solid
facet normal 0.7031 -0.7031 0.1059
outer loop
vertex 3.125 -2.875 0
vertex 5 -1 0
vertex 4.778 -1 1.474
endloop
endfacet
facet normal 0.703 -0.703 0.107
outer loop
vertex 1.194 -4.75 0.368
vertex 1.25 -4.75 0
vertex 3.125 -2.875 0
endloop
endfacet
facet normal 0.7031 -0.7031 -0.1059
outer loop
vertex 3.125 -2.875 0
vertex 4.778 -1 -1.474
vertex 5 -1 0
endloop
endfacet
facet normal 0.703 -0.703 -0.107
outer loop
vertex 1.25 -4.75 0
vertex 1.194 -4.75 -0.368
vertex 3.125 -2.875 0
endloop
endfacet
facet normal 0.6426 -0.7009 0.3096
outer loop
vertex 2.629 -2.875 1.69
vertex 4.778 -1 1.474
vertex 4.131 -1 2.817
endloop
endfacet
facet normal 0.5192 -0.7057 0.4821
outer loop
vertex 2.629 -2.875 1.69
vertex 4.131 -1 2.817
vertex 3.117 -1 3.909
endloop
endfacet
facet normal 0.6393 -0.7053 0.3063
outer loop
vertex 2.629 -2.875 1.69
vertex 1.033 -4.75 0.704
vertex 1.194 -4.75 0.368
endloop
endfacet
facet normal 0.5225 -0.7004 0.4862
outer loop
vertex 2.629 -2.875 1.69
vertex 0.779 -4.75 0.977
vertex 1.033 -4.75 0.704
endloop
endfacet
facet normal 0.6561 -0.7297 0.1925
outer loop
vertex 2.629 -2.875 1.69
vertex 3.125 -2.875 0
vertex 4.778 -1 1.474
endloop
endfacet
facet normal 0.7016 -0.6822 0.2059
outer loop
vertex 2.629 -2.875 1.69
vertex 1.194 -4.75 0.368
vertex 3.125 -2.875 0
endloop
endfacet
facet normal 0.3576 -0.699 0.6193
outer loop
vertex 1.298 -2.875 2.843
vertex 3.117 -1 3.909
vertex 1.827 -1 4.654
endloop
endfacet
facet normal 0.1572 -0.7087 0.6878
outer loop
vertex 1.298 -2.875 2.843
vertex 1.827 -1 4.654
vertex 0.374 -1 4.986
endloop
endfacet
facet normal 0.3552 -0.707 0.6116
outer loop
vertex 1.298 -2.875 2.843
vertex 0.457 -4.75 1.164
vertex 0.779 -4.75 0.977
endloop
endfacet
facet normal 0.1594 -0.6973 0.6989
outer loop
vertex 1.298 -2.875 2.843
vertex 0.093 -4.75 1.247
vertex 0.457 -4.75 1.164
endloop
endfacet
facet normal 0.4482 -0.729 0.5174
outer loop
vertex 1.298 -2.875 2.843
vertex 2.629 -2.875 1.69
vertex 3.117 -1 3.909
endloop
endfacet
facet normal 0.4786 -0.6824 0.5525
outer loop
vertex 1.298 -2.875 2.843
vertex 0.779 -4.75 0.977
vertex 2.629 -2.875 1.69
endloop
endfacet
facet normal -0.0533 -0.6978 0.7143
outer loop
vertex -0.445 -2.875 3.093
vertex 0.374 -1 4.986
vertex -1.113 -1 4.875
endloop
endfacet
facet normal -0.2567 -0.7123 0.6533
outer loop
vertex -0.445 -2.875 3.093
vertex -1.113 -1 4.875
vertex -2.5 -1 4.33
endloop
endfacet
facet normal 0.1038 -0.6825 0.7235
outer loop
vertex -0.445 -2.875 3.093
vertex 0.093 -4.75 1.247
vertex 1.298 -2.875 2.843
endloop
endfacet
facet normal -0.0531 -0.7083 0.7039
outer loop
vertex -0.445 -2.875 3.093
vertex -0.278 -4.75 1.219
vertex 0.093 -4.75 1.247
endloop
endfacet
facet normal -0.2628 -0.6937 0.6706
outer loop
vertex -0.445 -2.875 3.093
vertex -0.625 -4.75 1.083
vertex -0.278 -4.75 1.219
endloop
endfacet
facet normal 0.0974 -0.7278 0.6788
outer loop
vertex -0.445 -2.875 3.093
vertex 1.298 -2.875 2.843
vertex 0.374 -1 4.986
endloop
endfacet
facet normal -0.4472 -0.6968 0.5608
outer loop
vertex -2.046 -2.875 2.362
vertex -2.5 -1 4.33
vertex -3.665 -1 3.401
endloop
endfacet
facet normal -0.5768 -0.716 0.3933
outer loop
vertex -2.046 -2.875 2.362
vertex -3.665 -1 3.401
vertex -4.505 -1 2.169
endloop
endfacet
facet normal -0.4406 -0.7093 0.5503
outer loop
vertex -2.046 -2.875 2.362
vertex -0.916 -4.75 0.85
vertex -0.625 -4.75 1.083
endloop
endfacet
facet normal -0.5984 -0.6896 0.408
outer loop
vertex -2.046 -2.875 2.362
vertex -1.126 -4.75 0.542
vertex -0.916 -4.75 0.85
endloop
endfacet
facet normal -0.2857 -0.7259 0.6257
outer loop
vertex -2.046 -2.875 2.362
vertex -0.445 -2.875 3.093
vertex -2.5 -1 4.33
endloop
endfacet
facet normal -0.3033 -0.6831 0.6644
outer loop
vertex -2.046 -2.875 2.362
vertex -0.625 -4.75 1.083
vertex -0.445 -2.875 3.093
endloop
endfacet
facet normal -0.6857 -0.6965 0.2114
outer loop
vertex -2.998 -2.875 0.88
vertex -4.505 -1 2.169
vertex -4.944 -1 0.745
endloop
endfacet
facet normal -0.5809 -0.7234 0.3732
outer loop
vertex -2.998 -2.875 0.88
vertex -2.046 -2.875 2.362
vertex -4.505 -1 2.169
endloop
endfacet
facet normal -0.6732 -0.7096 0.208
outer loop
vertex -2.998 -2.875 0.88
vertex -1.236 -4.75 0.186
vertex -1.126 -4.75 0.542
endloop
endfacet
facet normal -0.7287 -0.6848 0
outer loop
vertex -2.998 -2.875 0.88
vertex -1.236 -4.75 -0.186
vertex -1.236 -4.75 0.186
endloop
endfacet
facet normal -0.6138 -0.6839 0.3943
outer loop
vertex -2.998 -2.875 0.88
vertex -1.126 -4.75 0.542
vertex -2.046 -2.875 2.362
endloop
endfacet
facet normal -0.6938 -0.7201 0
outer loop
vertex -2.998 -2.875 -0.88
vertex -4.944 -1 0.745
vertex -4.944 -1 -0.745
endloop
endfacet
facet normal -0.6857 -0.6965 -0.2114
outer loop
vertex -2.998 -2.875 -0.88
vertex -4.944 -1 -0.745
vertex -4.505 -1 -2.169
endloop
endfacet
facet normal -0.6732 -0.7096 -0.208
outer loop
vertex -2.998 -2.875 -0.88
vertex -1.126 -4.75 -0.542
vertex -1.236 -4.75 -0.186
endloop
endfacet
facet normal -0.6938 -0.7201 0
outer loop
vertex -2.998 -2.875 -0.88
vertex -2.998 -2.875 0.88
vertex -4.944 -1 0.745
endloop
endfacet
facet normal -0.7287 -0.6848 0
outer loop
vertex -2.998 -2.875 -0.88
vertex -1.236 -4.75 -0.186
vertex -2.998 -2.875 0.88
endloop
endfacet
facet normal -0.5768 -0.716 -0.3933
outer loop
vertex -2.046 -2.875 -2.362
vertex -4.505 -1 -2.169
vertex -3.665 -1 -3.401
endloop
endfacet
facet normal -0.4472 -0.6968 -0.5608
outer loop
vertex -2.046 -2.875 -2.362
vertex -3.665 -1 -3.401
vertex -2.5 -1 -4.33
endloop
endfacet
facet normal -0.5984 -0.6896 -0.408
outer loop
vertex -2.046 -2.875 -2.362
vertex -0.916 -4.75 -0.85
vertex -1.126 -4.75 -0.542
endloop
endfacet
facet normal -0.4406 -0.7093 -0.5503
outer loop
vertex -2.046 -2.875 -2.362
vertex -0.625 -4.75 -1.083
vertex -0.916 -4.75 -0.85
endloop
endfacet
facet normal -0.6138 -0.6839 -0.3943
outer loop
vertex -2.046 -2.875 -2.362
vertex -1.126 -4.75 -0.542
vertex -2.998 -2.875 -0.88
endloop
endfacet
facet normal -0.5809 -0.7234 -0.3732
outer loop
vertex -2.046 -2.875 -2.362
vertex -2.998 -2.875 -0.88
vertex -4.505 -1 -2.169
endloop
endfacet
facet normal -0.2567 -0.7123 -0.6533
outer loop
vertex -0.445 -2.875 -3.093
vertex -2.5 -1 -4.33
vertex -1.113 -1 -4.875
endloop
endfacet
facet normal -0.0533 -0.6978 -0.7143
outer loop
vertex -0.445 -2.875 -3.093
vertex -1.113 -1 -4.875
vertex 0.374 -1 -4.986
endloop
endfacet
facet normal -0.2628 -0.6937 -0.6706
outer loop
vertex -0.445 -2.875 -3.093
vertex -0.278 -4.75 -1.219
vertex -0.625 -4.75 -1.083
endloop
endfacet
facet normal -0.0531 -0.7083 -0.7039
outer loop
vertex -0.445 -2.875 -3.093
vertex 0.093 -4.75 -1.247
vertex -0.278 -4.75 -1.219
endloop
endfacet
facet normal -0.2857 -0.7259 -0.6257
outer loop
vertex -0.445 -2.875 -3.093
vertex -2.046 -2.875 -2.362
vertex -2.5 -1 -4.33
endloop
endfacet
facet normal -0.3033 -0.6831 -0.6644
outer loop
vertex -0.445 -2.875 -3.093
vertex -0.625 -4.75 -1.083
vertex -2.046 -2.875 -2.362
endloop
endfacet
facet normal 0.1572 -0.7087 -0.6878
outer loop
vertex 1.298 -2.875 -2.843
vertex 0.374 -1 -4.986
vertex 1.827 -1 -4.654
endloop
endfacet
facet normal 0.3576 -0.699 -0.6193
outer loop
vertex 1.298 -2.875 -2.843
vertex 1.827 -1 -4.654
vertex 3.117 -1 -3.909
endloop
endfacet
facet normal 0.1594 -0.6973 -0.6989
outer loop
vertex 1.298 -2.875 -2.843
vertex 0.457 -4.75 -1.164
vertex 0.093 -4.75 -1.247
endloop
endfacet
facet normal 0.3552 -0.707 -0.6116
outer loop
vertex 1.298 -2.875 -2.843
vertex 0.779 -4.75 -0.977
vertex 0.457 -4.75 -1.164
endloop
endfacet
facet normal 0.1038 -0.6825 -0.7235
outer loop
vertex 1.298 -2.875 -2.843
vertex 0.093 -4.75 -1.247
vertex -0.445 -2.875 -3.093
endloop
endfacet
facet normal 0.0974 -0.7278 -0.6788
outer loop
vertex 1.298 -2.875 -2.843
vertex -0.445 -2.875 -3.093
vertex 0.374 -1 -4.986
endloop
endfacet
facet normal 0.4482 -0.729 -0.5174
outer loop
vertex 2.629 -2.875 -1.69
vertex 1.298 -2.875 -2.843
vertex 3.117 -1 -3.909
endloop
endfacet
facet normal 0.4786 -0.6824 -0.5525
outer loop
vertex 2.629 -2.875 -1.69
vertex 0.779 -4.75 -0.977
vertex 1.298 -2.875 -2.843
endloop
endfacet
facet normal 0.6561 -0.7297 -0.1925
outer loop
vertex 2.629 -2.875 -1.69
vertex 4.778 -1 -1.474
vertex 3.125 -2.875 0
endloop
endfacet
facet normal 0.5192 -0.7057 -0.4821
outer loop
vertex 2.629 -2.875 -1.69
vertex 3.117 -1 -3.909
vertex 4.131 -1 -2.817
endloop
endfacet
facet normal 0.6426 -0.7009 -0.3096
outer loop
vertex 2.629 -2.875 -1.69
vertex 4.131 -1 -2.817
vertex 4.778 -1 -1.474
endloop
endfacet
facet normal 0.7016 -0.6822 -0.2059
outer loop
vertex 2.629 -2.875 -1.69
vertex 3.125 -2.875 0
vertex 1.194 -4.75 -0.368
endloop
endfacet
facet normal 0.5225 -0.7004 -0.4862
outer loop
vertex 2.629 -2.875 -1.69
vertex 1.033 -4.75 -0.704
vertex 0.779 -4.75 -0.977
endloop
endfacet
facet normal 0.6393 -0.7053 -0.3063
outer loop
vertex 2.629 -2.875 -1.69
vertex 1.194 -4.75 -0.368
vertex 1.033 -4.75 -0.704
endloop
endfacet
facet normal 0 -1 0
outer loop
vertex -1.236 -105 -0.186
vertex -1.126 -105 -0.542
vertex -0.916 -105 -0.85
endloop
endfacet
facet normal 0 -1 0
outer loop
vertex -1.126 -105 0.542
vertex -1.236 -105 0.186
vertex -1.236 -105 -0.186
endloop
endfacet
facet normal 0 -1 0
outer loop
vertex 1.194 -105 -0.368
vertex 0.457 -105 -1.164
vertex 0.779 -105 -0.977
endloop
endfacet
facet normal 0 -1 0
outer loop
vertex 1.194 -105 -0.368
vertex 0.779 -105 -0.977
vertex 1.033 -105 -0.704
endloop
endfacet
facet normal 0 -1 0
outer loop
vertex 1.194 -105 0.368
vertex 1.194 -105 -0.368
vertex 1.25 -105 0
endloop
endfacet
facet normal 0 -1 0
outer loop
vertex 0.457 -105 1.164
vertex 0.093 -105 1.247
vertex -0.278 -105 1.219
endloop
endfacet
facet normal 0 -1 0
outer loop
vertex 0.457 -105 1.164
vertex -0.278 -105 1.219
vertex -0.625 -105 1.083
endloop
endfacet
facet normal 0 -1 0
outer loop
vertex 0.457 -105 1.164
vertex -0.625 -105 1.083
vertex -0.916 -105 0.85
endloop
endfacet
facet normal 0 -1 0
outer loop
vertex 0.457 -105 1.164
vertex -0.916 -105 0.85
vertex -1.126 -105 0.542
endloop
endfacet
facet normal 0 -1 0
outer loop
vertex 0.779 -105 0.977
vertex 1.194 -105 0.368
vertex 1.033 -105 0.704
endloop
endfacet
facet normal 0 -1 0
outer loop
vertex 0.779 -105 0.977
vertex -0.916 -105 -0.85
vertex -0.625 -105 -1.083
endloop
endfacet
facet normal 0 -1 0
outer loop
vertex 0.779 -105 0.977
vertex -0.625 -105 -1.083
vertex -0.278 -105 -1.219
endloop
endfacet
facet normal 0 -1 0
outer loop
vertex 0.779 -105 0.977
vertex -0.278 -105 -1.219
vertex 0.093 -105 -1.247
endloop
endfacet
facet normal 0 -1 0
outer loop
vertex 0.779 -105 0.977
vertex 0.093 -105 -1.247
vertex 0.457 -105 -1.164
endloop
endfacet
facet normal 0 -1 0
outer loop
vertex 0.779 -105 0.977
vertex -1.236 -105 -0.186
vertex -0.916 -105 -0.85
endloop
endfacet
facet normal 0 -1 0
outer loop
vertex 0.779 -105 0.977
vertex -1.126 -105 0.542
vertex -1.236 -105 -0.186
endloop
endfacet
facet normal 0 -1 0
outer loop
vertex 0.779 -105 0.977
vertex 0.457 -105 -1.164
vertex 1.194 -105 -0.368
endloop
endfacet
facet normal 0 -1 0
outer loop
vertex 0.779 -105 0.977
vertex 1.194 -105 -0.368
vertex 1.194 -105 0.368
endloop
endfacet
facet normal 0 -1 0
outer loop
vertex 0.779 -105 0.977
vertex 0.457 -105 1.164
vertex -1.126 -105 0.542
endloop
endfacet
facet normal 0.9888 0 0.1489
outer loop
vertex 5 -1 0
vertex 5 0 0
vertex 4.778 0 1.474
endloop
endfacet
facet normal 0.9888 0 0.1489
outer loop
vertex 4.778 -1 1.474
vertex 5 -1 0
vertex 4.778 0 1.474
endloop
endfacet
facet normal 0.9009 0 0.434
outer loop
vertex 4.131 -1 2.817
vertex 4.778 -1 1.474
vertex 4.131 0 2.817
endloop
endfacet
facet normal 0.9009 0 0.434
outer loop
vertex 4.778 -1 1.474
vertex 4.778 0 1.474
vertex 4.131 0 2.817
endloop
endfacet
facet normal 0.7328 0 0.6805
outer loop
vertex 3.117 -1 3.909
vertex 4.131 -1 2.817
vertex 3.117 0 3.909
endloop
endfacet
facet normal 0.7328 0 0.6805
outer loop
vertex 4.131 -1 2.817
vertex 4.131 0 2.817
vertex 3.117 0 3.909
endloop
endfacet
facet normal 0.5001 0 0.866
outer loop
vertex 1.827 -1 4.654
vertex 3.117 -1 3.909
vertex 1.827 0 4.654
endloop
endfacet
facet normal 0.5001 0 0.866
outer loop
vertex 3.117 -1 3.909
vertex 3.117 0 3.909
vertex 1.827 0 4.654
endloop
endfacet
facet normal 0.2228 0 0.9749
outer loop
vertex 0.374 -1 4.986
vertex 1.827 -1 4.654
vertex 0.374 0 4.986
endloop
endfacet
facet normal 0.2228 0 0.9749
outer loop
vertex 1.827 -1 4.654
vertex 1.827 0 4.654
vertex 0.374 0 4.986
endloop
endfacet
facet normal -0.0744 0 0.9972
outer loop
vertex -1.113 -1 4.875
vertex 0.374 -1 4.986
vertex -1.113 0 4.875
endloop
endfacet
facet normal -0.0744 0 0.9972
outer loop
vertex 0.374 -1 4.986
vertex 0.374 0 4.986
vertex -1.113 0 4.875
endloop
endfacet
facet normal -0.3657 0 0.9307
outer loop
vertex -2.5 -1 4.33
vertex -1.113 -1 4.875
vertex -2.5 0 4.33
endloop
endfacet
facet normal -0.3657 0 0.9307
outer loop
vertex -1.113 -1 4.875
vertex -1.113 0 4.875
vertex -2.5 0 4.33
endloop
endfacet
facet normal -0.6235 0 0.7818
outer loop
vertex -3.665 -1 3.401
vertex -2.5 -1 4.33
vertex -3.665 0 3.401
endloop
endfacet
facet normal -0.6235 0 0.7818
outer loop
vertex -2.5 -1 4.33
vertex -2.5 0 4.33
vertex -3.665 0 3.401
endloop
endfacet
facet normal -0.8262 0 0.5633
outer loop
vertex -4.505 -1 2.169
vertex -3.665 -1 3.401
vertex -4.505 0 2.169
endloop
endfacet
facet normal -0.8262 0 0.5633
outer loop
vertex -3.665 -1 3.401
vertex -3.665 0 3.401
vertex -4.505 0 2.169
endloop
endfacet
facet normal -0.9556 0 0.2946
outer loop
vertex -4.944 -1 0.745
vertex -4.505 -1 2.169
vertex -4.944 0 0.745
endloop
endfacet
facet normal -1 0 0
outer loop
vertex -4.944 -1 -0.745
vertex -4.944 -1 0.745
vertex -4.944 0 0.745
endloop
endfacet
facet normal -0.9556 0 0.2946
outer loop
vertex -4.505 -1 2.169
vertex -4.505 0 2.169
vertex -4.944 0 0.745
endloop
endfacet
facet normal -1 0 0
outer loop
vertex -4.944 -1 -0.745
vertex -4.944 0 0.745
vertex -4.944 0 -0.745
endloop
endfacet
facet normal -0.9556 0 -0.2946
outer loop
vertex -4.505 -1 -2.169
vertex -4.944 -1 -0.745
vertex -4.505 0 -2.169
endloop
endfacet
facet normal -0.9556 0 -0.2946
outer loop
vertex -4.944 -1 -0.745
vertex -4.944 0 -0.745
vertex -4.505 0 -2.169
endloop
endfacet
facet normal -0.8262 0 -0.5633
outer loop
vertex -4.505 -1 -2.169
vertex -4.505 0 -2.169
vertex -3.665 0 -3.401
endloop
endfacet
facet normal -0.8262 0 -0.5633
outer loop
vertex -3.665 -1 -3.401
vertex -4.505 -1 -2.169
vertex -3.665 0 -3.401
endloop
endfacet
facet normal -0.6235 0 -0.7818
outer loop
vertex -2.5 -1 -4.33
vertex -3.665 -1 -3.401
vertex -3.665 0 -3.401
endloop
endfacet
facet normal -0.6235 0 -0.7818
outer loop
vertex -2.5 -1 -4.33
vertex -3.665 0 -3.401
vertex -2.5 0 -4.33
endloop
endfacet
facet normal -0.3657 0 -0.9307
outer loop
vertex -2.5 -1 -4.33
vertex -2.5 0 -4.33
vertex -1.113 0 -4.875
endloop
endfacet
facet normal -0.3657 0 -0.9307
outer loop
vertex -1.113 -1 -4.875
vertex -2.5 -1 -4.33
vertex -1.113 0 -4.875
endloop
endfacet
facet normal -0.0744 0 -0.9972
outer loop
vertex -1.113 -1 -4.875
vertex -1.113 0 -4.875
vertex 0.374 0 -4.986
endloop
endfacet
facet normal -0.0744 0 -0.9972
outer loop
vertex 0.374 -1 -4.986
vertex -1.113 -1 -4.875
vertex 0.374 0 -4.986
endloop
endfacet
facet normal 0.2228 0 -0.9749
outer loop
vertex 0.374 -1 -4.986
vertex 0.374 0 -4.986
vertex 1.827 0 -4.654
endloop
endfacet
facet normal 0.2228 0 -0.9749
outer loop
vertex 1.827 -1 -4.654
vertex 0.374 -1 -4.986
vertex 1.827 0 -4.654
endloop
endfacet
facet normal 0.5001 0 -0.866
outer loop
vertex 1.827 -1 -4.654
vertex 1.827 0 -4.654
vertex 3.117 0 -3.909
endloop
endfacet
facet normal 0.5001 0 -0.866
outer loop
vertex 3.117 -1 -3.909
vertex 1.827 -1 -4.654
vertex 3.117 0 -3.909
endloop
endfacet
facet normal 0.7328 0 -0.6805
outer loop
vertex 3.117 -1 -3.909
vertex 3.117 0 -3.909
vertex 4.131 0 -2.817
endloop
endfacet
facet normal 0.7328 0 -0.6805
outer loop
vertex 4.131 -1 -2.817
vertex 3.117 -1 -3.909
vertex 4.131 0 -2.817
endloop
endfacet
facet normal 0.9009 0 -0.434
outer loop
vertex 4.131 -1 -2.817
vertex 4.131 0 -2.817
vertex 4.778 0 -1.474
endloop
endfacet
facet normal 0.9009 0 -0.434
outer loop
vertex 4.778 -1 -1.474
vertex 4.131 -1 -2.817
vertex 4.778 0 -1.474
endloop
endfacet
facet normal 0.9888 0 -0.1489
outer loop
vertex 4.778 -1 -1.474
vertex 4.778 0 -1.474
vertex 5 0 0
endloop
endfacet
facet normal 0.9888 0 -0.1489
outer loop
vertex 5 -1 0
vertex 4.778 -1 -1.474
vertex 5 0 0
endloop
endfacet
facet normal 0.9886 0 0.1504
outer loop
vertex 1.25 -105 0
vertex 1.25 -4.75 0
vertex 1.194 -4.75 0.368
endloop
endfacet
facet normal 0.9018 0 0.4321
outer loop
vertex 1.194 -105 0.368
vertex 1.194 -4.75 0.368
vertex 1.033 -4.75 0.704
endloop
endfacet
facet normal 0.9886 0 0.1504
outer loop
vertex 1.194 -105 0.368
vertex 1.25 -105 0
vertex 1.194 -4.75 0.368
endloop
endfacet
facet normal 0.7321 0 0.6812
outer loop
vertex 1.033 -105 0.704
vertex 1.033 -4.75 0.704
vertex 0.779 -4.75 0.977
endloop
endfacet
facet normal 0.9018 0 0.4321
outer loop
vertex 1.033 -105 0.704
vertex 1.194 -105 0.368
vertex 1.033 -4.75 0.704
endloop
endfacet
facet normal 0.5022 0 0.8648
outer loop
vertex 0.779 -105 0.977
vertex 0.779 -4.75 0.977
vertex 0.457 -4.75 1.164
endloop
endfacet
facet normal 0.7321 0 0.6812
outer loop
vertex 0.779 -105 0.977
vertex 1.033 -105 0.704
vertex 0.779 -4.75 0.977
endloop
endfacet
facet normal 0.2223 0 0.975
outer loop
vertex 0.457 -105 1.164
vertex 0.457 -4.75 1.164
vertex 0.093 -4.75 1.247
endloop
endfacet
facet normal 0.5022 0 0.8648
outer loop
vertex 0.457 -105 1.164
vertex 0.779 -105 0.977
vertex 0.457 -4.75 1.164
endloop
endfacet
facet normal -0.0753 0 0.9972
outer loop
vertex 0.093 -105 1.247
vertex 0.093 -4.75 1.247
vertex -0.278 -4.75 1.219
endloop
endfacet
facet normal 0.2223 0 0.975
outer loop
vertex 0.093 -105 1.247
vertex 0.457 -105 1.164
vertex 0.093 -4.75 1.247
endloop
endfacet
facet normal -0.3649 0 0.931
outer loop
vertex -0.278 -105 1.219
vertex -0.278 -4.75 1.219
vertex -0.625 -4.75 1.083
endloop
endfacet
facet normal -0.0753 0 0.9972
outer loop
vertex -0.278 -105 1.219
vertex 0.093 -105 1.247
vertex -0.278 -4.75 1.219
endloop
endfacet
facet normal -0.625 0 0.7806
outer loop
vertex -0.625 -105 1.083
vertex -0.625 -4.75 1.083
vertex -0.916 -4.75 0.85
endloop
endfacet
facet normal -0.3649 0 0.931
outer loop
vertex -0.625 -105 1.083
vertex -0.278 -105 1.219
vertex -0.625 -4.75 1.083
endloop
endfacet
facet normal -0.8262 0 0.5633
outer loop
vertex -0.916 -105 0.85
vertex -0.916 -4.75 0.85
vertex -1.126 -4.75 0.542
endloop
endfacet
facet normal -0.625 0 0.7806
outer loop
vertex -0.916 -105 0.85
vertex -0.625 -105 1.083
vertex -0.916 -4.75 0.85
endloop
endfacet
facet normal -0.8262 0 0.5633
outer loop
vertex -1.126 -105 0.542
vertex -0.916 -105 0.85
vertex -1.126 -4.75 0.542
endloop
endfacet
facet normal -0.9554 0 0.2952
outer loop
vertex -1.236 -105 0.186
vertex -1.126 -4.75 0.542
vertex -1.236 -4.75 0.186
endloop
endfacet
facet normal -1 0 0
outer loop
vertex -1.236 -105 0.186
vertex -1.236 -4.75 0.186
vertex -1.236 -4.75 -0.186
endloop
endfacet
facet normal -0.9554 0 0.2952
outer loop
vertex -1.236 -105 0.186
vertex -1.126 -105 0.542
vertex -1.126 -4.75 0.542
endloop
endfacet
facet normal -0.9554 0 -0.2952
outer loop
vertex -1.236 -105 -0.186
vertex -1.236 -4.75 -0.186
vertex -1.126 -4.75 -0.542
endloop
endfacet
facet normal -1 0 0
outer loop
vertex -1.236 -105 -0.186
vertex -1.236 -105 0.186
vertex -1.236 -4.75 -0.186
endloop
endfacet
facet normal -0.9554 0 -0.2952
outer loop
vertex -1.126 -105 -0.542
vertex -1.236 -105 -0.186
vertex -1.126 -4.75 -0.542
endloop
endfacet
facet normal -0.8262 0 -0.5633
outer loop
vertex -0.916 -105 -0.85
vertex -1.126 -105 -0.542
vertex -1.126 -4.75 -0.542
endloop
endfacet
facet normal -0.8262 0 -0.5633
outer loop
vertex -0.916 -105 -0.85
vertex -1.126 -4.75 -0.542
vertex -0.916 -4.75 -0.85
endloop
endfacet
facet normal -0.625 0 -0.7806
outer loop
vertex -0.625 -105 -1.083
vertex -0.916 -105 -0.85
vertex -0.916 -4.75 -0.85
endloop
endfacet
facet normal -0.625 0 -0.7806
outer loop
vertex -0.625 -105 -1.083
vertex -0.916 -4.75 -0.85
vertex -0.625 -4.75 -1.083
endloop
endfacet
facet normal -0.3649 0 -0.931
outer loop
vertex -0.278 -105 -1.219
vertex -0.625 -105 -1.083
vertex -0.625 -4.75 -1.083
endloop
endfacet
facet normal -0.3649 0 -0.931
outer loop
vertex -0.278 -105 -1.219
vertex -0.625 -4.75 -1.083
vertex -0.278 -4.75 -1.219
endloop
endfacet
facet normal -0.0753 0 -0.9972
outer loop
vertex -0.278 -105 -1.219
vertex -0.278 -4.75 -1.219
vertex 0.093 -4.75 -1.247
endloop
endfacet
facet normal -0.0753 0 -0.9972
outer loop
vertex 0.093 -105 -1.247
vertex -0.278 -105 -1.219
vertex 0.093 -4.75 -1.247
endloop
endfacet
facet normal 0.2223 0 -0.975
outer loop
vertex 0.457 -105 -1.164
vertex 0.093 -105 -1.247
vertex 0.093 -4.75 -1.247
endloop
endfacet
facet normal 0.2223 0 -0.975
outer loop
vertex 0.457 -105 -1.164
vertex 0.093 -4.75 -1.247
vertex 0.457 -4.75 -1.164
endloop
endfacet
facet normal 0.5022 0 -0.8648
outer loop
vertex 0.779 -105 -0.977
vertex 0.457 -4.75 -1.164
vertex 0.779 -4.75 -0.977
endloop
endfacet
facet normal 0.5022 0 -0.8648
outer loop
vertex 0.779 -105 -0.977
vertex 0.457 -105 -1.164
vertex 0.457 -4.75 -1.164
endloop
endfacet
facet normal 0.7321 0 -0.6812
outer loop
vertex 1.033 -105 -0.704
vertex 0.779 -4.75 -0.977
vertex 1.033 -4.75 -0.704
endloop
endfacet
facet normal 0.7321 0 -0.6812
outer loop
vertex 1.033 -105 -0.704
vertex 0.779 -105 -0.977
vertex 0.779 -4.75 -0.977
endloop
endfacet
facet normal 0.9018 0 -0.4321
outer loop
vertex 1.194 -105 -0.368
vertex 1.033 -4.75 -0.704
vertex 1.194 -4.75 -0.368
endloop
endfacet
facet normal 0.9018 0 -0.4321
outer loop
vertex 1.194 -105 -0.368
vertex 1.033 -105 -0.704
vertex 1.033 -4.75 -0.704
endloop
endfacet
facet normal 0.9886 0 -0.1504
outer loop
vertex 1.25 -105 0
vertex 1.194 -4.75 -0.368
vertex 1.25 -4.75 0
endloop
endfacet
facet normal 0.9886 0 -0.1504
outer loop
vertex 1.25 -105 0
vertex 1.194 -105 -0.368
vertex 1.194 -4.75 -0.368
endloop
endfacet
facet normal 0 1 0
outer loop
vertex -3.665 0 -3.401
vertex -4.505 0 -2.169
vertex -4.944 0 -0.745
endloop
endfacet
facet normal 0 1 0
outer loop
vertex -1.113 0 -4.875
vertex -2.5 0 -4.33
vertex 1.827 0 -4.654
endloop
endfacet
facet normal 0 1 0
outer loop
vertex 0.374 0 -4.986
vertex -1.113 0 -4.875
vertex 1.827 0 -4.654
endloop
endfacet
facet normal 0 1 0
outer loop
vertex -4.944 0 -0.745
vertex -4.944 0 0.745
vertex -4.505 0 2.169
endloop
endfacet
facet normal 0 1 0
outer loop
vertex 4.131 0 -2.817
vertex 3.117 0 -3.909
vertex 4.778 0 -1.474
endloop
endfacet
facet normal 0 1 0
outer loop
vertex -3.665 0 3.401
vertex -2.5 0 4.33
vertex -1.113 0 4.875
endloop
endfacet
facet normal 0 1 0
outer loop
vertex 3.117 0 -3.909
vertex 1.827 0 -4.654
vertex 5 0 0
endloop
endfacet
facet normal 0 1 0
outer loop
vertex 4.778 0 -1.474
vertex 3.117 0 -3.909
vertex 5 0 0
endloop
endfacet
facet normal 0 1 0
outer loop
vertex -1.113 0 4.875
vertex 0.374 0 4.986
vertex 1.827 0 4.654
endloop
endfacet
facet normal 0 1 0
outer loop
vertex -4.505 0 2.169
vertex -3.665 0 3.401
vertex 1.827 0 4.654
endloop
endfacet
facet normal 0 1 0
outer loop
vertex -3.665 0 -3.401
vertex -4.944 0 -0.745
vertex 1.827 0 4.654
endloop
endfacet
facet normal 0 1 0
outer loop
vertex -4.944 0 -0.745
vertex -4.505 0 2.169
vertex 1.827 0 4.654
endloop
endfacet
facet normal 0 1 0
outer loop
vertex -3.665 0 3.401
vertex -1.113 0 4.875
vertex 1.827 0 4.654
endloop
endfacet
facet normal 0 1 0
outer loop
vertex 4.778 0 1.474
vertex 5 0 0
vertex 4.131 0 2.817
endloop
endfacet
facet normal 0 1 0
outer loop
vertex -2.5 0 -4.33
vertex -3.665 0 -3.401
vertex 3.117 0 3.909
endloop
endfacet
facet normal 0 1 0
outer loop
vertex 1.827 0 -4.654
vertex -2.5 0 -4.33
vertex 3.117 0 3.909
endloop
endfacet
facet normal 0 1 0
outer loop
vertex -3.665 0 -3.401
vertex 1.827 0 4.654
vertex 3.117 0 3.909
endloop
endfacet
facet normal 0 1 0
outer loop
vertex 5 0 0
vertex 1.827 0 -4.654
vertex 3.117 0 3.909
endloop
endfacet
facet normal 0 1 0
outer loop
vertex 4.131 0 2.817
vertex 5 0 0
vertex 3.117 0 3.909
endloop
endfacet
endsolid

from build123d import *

# Parameters (mm, degrees)
F0_R        = 5
F1_DEPTH    = 5
F2_R        = 1.25
F3_DEPTH    = 100
F4_S5_R     = 1.25
F4_T6_DEPTH = 9


# Not quite as in the source:
# - a fillet or chamfer that OpenCascade refuses, or shapes differently, is made with other operations: its cross-section is extruded or revolved along the edge and cut away or added


with BuildPart() as f1:
    # F0 (on Front) → F1 (new body)
    with BuildSketch(Plane.XZ):
        Circle(F0_R)
    extrude(amount=F1_DEPTH)

    # F2 (on face) → F3 (join)
    with BuildSketch(Plane.XZ.offset(5)):
        Circle(F2_R)
    extrude(amount=F3_DEPTH)

    # F4: chamfer of 4 on 1 edges, made by hand


with BuildPart() as f4_tool2:
    # F4_s3 → F4_t4 (revolve)
    with BuildSketch(Plane.XY):
        Polygon((5, -1), (1, -5), (5, -5), align=None)
    revolve(axis=Axis((0, -5, 0), (0, -1, 0)))

    # F4_s5 → F4_t6 (cut, symmetric)
    with BuildSketch(Plane.XZ.offset(3)):
        Circle(F4_S5_R)
    extrude(amount=F4_T6_DEPTH, both=True, mode=Mode.SUBTRACT)


with BuildPart() as f1_1:
    add(f1.part)

    # F4_t1: cut F4_tool2
    add(f4_tool2.part, mode=Mode.SUBTRACT)


solid = f1_1.part
